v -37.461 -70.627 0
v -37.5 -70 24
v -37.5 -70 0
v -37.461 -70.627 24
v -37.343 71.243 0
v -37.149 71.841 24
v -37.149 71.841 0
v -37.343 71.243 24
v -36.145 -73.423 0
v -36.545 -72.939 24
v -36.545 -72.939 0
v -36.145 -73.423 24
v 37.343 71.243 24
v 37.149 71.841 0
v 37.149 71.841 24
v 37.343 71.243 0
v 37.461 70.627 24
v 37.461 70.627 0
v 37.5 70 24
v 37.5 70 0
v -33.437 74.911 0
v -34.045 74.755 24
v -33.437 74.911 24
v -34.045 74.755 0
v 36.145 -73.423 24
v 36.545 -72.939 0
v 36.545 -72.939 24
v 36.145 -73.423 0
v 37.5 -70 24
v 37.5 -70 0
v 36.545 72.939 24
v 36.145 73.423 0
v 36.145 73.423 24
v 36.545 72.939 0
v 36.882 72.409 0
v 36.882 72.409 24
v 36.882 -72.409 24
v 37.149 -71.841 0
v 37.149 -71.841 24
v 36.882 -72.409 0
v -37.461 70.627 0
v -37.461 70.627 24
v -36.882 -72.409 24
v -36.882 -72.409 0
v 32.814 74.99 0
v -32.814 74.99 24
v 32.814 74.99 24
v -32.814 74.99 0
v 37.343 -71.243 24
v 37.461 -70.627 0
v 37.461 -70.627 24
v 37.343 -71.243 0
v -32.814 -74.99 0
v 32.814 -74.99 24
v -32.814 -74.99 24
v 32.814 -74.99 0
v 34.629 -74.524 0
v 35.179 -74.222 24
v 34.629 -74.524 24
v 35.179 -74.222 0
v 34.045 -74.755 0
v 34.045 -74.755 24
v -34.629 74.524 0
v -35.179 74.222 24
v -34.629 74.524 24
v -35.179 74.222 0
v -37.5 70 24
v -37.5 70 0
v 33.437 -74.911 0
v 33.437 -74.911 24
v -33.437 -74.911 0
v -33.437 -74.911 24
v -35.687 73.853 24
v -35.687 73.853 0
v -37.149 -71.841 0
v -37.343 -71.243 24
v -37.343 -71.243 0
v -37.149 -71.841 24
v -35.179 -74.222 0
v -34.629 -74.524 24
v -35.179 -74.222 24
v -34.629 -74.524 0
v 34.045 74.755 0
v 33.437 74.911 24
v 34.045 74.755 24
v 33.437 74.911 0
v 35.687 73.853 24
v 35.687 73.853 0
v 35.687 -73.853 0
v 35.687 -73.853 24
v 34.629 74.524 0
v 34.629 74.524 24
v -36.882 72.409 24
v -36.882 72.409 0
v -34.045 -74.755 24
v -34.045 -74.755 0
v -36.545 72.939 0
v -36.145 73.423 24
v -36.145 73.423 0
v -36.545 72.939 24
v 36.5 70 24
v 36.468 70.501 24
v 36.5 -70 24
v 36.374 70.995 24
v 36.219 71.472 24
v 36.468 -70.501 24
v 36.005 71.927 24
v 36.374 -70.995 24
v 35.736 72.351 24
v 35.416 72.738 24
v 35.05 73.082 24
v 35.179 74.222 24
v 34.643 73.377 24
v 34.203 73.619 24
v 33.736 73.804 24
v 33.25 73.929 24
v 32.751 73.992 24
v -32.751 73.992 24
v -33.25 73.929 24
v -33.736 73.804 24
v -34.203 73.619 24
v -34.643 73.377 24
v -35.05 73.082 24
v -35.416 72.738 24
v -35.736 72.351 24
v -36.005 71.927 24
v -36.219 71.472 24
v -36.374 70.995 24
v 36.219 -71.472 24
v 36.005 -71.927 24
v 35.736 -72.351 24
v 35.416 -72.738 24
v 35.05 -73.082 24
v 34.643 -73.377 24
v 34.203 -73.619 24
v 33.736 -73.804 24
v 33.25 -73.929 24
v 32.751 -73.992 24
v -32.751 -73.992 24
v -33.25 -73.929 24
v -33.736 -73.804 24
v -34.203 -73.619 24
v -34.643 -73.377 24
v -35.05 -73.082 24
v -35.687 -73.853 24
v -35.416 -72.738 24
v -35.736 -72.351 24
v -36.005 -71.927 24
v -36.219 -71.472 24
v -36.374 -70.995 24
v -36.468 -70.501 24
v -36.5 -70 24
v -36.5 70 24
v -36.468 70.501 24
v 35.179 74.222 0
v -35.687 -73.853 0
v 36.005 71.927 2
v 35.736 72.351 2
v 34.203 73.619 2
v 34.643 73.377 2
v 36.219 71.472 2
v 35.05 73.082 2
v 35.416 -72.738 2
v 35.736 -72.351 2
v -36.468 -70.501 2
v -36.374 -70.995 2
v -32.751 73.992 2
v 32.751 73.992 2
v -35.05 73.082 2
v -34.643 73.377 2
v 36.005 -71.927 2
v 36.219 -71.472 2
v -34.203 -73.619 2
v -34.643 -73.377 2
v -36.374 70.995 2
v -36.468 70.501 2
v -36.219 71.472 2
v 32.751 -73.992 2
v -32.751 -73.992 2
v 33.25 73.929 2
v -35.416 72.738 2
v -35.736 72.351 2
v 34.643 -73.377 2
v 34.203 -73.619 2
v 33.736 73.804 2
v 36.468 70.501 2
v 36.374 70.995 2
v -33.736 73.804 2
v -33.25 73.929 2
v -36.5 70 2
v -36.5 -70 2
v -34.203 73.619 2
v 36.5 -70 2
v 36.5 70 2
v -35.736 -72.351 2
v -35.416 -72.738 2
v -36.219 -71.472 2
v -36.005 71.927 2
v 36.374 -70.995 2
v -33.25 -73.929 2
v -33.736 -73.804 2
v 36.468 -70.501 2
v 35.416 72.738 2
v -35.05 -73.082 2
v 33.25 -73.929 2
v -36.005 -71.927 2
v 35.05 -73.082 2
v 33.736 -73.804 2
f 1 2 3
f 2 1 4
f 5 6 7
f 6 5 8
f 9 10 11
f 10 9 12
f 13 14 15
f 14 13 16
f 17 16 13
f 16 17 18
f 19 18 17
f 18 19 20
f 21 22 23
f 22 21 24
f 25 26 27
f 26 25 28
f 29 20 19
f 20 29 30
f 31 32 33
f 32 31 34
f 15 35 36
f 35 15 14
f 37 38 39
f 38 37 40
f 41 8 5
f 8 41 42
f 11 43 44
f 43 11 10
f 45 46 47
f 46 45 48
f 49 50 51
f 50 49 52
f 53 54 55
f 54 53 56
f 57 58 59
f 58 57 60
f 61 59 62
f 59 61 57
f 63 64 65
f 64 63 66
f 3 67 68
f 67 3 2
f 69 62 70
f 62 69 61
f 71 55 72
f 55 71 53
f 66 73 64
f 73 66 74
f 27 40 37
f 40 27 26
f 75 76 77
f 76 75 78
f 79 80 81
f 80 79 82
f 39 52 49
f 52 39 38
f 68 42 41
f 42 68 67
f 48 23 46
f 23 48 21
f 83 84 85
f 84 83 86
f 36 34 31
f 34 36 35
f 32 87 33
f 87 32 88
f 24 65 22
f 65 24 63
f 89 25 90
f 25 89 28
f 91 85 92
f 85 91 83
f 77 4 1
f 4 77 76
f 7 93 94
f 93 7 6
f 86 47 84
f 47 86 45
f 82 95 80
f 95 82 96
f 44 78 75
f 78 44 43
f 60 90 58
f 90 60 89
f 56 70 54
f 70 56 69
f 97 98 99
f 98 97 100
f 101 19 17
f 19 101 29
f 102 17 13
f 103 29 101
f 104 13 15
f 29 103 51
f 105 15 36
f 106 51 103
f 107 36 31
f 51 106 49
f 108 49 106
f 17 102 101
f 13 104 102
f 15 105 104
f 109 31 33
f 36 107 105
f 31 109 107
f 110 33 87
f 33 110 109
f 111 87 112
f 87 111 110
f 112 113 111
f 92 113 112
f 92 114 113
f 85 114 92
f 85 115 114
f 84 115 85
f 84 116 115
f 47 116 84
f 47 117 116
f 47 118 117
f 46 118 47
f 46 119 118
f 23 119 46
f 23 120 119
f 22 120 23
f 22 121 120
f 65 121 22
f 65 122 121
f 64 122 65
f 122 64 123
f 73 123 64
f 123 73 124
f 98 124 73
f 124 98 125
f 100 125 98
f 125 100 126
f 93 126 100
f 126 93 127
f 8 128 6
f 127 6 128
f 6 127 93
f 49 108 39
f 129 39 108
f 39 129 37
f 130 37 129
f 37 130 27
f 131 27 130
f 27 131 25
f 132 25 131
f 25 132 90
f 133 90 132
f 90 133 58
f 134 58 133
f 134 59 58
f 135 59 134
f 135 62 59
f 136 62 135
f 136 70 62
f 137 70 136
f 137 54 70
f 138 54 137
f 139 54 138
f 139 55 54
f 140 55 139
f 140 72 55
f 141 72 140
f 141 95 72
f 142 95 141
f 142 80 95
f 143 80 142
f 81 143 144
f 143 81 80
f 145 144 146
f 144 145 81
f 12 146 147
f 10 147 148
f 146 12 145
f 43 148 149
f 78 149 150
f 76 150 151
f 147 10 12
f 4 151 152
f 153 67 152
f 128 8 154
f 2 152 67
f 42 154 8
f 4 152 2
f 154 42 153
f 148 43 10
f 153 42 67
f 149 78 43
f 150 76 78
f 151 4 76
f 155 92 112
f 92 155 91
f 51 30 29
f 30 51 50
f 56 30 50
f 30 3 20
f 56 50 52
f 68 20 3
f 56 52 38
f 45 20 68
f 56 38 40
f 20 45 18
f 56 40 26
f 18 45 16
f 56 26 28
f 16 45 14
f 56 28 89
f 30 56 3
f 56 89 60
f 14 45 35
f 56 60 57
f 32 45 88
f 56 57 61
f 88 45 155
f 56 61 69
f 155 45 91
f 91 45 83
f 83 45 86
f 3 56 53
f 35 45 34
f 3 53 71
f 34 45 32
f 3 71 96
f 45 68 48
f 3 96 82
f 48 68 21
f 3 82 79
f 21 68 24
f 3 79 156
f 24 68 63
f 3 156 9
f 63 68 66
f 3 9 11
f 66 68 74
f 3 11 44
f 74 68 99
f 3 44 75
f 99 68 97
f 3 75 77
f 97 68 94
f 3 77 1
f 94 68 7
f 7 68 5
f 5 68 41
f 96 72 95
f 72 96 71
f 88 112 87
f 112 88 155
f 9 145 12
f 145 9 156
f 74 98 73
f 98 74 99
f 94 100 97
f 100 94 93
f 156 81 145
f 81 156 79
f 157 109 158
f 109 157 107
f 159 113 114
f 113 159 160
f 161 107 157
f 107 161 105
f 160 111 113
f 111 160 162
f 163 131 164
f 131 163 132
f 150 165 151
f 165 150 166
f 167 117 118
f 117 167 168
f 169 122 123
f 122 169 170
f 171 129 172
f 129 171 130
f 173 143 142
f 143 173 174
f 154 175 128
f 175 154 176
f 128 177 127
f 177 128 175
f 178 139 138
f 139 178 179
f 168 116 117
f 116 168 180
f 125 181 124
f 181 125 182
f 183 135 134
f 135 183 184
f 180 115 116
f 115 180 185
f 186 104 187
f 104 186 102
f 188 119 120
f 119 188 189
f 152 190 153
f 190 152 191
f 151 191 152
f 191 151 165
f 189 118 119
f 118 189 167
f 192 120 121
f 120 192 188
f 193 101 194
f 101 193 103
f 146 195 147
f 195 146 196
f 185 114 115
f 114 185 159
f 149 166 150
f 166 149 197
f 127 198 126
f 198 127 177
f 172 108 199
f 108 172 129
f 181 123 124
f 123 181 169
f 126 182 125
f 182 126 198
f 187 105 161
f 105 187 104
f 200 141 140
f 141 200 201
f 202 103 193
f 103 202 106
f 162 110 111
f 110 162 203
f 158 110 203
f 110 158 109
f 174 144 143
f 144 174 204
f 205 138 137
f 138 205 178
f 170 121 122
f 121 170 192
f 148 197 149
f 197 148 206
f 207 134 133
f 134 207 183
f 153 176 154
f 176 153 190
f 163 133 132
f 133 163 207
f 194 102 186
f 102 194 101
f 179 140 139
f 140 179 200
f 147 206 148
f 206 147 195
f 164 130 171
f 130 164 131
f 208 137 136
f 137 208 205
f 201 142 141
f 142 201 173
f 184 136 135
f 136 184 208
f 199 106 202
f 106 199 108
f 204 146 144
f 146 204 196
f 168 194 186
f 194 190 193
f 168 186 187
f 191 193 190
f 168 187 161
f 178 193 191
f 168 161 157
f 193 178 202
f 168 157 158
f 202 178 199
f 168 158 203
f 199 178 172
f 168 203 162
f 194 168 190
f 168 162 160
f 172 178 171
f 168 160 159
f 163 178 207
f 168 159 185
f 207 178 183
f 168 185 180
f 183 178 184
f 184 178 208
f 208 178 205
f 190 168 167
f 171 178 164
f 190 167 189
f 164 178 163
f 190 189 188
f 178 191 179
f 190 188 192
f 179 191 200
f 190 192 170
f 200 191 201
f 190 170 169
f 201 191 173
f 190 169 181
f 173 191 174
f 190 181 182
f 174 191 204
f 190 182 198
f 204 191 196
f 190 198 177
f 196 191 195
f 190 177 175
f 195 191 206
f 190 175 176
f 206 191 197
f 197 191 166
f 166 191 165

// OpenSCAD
$fn = 50;


difference() {
	union() {
		hull() {
			translate(v = [-32.5000000000, 70.0000000000, 0]) {
				cylinder(h = 24, r = 5);
			}
			translate(v = [32.5000000000, 70.0000000000, 0]) {
				cylinder(h = 24, r = 5);
			}
			translate(v = [-32.5000000000, -70.0000000000, 0]) {
				cylinder(h = 24, r = 5);
			}
			translate(v = [32.5000000000, -70.0000000000, 0]) {
				cylinder(h = 24, r = 5);
			}
		}
	}
	union() {
		translate(v = [0, 0, 2]) {
			hull() {
				translate(v = [-32.5000000000, 70.0000000000, 0]) {
					cylinder(h = 22, r = 4);
				}
				translate(v = [32.5000000000, 70.0000000000, 0]) {
					cylinder(h = 22, r = 4);
				}
				translate(v = [-32.5000000000, -70.0000000000, 0]) {
					cylinder(h = 22, r = 4);
				}
				translate(v = [32.5000000000, -70.0000000000, 0]) {
					cylinder(h = 22, r = 4);
				}
			}
		}
	}
}
